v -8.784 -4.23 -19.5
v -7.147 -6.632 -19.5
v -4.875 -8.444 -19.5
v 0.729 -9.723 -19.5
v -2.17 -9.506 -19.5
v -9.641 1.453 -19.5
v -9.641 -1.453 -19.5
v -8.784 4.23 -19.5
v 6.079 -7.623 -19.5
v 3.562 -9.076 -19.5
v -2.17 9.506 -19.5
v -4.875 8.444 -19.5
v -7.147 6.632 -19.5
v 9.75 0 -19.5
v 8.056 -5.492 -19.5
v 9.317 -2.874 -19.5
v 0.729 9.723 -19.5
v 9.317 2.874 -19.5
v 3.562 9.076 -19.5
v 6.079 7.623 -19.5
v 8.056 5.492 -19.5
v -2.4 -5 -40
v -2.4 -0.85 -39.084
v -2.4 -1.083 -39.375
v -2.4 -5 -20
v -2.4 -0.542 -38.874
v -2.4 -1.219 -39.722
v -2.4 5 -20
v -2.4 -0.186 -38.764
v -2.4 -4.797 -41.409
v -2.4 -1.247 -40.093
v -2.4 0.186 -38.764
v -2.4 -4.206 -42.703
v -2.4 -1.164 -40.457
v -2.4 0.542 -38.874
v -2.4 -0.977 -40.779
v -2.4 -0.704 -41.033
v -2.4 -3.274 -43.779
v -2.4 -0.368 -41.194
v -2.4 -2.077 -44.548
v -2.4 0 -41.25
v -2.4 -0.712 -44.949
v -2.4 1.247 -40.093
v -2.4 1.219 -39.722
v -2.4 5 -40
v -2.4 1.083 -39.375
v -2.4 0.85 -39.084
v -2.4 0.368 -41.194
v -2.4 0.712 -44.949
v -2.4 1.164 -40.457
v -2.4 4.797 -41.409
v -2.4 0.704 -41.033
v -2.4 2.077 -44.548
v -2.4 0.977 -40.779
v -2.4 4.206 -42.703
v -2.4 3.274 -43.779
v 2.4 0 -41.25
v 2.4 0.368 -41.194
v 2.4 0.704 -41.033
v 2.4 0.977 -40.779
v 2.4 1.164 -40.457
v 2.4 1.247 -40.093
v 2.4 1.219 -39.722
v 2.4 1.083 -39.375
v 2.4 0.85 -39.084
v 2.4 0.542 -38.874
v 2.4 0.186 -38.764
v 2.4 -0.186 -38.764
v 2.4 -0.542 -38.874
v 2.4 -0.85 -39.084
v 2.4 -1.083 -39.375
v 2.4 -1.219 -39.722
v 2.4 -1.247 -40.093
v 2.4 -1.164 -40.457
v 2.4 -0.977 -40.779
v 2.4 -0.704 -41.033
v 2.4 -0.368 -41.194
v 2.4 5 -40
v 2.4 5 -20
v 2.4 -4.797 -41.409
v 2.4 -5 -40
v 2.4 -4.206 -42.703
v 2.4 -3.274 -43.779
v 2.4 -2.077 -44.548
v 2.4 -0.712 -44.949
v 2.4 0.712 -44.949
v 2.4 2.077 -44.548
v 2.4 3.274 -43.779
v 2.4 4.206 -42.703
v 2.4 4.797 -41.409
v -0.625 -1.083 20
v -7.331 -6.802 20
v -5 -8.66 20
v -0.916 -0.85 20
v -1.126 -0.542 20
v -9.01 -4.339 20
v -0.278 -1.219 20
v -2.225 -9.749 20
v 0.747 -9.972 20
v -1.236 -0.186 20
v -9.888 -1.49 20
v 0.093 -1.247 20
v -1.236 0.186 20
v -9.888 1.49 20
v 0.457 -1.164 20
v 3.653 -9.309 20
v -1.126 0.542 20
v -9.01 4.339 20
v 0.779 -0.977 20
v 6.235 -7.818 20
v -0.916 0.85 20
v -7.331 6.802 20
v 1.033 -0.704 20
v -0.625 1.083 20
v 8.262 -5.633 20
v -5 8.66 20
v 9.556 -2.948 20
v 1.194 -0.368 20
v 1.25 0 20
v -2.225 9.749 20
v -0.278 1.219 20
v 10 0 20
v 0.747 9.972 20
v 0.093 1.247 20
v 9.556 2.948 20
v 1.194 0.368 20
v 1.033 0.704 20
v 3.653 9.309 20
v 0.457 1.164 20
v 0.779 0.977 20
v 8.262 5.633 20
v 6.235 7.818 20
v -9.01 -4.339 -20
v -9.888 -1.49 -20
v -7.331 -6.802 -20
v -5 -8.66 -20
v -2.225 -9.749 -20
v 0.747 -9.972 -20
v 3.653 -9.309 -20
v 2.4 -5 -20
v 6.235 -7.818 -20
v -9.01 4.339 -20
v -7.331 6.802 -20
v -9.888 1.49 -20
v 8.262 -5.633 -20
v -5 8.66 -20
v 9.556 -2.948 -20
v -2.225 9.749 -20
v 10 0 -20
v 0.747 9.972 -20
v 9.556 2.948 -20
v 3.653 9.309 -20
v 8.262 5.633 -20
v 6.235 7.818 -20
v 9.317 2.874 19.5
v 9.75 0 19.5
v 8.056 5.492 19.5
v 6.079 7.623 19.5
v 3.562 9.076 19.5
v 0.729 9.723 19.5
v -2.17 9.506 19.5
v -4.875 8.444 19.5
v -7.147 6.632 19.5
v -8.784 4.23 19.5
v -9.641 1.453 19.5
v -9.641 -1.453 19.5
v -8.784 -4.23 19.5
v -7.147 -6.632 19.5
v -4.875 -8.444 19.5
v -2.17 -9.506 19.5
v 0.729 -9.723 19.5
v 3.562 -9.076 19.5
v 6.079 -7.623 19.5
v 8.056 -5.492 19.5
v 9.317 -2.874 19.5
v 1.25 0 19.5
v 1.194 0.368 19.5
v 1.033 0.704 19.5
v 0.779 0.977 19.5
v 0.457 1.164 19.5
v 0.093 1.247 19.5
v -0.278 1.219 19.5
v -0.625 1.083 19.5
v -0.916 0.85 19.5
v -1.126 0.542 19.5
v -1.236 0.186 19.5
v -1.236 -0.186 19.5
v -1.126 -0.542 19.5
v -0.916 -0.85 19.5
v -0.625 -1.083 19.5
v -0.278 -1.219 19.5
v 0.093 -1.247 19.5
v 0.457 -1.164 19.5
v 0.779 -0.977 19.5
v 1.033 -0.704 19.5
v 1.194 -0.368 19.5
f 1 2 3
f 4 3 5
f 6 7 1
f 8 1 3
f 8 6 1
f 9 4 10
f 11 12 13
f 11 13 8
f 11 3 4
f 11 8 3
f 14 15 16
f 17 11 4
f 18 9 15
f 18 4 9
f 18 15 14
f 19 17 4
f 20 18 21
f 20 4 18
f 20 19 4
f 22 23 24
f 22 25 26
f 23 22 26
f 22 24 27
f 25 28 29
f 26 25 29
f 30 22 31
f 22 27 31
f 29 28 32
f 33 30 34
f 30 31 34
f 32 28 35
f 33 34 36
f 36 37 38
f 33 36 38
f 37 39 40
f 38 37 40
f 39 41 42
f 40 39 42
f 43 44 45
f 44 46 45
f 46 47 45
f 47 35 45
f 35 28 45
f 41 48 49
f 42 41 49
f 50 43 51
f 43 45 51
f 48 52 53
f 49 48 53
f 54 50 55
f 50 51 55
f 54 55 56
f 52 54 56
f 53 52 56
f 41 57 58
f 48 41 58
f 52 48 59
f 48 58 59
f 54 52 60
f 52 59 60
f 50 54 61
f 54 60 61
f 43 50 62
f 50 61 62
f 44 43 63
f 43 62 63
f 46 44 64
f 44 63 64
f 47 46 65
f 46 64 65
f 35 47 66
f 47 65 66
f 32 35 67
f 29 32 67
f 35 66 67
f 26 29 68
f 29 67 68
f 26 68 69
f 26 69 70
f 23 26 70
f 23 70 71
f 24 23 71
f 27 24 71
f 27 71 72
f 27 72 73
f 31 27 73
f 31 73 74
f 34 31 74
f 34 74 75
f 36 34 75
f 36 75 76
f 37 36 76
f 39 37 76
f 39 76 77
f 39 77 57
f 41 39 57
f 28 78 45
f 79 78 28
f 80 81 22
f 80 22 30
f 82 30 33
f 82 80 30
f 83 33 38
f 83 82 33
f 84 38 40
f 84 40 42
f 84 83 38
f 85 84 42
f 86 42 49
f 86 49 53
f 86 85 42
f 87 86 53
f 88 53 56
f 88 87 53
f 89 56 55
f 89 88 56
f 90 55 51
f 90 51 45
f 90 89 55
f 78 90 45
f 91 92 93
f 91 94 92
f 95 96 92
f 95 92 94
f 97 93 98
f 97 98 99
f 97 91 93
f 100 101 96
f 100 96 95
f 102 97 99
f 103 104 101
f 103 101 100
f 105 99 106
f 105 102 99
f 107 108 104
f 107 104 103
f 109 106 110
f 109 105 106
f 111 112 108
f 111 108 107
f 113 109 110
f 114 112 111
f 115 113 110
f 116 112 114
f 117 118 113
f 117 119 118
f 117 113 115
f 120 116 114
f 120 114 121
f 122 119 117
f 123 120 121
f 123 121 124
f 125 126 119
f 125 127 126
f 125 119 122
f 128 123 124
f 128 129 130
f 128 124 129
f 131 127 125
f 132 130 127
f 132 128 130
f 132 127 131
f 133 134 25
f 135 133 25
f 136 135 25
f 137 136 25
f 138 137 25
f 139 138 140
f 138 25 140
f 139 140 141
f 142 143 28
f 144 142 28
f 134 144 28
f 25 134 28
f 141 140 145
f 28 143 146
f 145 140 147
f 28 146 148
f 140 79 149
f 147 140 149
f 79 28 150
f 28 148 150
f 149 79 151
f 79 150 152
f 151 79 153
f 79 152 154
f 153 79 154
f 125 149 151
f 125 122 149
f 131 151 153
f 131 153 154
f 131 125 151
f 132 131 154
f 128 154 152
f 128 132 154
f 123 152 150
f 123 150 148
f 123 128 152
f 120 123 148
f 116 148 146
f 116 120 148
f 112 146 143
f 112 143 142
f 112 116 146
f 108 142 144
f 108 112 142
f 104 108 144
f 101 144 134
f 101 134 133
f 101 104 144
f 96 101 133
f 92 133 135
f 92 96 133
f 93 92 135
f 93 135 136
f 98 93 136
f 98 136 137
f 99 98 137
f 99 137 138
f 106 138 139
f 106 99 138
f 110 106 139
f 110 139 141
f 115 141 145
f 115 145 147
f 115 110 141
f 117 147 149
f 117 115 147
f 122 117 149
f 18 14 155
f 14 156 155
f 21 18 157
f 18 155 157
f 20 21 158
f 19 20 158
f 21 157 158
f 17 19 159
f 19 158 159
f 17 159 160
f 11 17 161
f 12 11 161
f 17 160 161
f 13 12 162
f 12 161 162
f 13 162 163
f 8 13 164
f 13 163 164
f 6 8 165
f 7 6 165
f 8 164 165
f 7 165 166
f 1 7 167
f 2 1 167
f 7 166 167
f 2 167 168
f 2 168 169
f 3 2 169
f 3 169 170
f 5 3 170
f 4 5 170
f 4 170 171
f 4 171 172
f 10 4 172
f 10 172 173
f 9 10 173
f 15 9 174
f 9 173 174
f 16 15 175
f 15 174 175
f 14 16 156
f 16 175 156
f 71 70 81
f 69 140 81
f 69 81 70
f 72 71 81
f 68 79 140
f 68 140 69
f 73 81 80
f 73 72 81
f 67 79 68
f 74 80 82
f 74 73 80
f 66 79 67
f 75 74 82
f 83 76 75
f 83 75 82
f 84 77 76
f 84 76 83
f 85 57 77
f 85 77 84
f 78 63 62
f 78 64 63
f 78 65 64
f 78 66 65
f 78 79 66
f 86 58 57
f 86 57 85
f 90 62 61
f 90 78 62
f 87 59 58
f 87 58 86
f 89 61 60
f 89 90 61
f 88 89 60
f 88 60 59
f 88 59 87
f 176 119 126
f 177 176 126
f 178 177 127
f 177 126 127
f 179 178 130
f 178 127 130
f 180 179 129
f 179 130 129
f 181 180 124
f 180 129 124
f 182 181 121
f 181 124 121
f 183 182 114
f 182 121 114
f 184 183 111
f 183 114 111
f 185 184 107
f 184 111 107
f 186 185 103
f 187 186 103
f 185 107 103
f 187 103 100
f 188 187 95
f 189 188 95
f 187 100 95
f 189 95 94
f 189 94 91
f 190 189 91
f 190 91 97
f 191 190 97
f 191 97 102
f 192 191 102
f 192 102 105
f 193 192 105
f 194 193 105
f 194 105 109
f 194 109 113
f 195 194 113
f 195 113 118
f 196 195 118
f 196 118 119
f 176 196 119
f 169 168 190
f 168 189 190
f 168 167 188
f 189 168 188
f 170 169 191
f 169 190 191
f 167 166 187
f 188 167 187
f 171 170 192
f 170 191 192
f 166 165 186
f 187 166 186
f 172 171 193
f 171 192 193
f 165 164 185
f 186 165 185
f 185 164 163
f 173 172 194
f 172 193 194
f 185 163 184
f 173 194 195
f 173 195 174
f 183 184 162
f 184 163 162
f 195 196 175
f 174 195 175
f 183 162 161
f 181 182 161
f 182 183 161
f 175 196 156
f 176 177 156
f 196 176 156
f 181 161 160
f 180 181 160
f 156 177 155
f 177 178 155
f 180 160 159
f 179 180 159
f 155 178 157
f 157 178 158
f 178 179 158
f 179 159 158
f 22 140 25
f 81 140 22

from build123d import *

# Parameters (mm, degrees)
SKETCH1_R           = 10
BOSS_EXTRUDE1_DEPTH = 20
SKETCH3_R           = 9.75
CUT_EXTRUDE1_DEPTH  = 19.5
SKETCH4_R           = 1.25
CUT_EXTRUDE2_DEPTH  = 1
BOSS_EXTRUDE2_DEPTH = 2.4
SKETCH7_R           = 1.25
CUT_EXTRUDE4_DEPTH  = 10


with BuildPart() as part:
    # Sketch1 → Boss-Extrude1 (new, symmetric)
    with BuildSketch(Plane.XY):
        Circle(SKETCH1_R)
    extrude(amount=BOSS_EXTRUDE1_DEPTH, both=True)

    # Sketch3 → Cut-Extrude1 (cut, symmetric)
    with BuildSketch(Plane.XY):
        Circle(SKETCH3_R)
    extrude(amount=CUT_EXTRUDE1_DEPTH, both=True, mode=Mode.SUBTRACT)

    # Sketch4 → Cut-Extrude2 (cut)
    with BuildSketch(Plane.XY.offset(20)):
        Circle(SKETCH4_R)
    extrude(amount=-CUT_EXTRUDE2_DEPTH, mode=Mode.SUBTRACT)

    # Sketch5 → Boss-Extrude2 (add, symmetric)
    with BuildSketch(Plane(origin=(0, 0, 0), x_dir=(0, 0, -1), z_dir=(1, 0, 0))):
        with BuildLine():
            Line((20, 5), (20, -5))
            Line((20, -5), (40, -5))
            ThreePointArc((40, -5), (45, 0), (40, 5))
            Line((40, 5), (20, 5))
        make_face()
    extrude(amount=BOSS_EXTRUDE2_DEPTH, both=True)

    # Sketch7 → Cut-Extrude4 (cut)
    with BuildSketch(Plane(origin=(2.4, 0, 0), x_dir=(0, 0, -1), z_dir=(1, 0, 0))):
        with Locations((40, 0)):
            Circle(SKETCH7_R)
    extrude(amount=-CUT_EXTRUDE4_DEPTH, mode=Mode.SUBTRACT)


solid = part.part
